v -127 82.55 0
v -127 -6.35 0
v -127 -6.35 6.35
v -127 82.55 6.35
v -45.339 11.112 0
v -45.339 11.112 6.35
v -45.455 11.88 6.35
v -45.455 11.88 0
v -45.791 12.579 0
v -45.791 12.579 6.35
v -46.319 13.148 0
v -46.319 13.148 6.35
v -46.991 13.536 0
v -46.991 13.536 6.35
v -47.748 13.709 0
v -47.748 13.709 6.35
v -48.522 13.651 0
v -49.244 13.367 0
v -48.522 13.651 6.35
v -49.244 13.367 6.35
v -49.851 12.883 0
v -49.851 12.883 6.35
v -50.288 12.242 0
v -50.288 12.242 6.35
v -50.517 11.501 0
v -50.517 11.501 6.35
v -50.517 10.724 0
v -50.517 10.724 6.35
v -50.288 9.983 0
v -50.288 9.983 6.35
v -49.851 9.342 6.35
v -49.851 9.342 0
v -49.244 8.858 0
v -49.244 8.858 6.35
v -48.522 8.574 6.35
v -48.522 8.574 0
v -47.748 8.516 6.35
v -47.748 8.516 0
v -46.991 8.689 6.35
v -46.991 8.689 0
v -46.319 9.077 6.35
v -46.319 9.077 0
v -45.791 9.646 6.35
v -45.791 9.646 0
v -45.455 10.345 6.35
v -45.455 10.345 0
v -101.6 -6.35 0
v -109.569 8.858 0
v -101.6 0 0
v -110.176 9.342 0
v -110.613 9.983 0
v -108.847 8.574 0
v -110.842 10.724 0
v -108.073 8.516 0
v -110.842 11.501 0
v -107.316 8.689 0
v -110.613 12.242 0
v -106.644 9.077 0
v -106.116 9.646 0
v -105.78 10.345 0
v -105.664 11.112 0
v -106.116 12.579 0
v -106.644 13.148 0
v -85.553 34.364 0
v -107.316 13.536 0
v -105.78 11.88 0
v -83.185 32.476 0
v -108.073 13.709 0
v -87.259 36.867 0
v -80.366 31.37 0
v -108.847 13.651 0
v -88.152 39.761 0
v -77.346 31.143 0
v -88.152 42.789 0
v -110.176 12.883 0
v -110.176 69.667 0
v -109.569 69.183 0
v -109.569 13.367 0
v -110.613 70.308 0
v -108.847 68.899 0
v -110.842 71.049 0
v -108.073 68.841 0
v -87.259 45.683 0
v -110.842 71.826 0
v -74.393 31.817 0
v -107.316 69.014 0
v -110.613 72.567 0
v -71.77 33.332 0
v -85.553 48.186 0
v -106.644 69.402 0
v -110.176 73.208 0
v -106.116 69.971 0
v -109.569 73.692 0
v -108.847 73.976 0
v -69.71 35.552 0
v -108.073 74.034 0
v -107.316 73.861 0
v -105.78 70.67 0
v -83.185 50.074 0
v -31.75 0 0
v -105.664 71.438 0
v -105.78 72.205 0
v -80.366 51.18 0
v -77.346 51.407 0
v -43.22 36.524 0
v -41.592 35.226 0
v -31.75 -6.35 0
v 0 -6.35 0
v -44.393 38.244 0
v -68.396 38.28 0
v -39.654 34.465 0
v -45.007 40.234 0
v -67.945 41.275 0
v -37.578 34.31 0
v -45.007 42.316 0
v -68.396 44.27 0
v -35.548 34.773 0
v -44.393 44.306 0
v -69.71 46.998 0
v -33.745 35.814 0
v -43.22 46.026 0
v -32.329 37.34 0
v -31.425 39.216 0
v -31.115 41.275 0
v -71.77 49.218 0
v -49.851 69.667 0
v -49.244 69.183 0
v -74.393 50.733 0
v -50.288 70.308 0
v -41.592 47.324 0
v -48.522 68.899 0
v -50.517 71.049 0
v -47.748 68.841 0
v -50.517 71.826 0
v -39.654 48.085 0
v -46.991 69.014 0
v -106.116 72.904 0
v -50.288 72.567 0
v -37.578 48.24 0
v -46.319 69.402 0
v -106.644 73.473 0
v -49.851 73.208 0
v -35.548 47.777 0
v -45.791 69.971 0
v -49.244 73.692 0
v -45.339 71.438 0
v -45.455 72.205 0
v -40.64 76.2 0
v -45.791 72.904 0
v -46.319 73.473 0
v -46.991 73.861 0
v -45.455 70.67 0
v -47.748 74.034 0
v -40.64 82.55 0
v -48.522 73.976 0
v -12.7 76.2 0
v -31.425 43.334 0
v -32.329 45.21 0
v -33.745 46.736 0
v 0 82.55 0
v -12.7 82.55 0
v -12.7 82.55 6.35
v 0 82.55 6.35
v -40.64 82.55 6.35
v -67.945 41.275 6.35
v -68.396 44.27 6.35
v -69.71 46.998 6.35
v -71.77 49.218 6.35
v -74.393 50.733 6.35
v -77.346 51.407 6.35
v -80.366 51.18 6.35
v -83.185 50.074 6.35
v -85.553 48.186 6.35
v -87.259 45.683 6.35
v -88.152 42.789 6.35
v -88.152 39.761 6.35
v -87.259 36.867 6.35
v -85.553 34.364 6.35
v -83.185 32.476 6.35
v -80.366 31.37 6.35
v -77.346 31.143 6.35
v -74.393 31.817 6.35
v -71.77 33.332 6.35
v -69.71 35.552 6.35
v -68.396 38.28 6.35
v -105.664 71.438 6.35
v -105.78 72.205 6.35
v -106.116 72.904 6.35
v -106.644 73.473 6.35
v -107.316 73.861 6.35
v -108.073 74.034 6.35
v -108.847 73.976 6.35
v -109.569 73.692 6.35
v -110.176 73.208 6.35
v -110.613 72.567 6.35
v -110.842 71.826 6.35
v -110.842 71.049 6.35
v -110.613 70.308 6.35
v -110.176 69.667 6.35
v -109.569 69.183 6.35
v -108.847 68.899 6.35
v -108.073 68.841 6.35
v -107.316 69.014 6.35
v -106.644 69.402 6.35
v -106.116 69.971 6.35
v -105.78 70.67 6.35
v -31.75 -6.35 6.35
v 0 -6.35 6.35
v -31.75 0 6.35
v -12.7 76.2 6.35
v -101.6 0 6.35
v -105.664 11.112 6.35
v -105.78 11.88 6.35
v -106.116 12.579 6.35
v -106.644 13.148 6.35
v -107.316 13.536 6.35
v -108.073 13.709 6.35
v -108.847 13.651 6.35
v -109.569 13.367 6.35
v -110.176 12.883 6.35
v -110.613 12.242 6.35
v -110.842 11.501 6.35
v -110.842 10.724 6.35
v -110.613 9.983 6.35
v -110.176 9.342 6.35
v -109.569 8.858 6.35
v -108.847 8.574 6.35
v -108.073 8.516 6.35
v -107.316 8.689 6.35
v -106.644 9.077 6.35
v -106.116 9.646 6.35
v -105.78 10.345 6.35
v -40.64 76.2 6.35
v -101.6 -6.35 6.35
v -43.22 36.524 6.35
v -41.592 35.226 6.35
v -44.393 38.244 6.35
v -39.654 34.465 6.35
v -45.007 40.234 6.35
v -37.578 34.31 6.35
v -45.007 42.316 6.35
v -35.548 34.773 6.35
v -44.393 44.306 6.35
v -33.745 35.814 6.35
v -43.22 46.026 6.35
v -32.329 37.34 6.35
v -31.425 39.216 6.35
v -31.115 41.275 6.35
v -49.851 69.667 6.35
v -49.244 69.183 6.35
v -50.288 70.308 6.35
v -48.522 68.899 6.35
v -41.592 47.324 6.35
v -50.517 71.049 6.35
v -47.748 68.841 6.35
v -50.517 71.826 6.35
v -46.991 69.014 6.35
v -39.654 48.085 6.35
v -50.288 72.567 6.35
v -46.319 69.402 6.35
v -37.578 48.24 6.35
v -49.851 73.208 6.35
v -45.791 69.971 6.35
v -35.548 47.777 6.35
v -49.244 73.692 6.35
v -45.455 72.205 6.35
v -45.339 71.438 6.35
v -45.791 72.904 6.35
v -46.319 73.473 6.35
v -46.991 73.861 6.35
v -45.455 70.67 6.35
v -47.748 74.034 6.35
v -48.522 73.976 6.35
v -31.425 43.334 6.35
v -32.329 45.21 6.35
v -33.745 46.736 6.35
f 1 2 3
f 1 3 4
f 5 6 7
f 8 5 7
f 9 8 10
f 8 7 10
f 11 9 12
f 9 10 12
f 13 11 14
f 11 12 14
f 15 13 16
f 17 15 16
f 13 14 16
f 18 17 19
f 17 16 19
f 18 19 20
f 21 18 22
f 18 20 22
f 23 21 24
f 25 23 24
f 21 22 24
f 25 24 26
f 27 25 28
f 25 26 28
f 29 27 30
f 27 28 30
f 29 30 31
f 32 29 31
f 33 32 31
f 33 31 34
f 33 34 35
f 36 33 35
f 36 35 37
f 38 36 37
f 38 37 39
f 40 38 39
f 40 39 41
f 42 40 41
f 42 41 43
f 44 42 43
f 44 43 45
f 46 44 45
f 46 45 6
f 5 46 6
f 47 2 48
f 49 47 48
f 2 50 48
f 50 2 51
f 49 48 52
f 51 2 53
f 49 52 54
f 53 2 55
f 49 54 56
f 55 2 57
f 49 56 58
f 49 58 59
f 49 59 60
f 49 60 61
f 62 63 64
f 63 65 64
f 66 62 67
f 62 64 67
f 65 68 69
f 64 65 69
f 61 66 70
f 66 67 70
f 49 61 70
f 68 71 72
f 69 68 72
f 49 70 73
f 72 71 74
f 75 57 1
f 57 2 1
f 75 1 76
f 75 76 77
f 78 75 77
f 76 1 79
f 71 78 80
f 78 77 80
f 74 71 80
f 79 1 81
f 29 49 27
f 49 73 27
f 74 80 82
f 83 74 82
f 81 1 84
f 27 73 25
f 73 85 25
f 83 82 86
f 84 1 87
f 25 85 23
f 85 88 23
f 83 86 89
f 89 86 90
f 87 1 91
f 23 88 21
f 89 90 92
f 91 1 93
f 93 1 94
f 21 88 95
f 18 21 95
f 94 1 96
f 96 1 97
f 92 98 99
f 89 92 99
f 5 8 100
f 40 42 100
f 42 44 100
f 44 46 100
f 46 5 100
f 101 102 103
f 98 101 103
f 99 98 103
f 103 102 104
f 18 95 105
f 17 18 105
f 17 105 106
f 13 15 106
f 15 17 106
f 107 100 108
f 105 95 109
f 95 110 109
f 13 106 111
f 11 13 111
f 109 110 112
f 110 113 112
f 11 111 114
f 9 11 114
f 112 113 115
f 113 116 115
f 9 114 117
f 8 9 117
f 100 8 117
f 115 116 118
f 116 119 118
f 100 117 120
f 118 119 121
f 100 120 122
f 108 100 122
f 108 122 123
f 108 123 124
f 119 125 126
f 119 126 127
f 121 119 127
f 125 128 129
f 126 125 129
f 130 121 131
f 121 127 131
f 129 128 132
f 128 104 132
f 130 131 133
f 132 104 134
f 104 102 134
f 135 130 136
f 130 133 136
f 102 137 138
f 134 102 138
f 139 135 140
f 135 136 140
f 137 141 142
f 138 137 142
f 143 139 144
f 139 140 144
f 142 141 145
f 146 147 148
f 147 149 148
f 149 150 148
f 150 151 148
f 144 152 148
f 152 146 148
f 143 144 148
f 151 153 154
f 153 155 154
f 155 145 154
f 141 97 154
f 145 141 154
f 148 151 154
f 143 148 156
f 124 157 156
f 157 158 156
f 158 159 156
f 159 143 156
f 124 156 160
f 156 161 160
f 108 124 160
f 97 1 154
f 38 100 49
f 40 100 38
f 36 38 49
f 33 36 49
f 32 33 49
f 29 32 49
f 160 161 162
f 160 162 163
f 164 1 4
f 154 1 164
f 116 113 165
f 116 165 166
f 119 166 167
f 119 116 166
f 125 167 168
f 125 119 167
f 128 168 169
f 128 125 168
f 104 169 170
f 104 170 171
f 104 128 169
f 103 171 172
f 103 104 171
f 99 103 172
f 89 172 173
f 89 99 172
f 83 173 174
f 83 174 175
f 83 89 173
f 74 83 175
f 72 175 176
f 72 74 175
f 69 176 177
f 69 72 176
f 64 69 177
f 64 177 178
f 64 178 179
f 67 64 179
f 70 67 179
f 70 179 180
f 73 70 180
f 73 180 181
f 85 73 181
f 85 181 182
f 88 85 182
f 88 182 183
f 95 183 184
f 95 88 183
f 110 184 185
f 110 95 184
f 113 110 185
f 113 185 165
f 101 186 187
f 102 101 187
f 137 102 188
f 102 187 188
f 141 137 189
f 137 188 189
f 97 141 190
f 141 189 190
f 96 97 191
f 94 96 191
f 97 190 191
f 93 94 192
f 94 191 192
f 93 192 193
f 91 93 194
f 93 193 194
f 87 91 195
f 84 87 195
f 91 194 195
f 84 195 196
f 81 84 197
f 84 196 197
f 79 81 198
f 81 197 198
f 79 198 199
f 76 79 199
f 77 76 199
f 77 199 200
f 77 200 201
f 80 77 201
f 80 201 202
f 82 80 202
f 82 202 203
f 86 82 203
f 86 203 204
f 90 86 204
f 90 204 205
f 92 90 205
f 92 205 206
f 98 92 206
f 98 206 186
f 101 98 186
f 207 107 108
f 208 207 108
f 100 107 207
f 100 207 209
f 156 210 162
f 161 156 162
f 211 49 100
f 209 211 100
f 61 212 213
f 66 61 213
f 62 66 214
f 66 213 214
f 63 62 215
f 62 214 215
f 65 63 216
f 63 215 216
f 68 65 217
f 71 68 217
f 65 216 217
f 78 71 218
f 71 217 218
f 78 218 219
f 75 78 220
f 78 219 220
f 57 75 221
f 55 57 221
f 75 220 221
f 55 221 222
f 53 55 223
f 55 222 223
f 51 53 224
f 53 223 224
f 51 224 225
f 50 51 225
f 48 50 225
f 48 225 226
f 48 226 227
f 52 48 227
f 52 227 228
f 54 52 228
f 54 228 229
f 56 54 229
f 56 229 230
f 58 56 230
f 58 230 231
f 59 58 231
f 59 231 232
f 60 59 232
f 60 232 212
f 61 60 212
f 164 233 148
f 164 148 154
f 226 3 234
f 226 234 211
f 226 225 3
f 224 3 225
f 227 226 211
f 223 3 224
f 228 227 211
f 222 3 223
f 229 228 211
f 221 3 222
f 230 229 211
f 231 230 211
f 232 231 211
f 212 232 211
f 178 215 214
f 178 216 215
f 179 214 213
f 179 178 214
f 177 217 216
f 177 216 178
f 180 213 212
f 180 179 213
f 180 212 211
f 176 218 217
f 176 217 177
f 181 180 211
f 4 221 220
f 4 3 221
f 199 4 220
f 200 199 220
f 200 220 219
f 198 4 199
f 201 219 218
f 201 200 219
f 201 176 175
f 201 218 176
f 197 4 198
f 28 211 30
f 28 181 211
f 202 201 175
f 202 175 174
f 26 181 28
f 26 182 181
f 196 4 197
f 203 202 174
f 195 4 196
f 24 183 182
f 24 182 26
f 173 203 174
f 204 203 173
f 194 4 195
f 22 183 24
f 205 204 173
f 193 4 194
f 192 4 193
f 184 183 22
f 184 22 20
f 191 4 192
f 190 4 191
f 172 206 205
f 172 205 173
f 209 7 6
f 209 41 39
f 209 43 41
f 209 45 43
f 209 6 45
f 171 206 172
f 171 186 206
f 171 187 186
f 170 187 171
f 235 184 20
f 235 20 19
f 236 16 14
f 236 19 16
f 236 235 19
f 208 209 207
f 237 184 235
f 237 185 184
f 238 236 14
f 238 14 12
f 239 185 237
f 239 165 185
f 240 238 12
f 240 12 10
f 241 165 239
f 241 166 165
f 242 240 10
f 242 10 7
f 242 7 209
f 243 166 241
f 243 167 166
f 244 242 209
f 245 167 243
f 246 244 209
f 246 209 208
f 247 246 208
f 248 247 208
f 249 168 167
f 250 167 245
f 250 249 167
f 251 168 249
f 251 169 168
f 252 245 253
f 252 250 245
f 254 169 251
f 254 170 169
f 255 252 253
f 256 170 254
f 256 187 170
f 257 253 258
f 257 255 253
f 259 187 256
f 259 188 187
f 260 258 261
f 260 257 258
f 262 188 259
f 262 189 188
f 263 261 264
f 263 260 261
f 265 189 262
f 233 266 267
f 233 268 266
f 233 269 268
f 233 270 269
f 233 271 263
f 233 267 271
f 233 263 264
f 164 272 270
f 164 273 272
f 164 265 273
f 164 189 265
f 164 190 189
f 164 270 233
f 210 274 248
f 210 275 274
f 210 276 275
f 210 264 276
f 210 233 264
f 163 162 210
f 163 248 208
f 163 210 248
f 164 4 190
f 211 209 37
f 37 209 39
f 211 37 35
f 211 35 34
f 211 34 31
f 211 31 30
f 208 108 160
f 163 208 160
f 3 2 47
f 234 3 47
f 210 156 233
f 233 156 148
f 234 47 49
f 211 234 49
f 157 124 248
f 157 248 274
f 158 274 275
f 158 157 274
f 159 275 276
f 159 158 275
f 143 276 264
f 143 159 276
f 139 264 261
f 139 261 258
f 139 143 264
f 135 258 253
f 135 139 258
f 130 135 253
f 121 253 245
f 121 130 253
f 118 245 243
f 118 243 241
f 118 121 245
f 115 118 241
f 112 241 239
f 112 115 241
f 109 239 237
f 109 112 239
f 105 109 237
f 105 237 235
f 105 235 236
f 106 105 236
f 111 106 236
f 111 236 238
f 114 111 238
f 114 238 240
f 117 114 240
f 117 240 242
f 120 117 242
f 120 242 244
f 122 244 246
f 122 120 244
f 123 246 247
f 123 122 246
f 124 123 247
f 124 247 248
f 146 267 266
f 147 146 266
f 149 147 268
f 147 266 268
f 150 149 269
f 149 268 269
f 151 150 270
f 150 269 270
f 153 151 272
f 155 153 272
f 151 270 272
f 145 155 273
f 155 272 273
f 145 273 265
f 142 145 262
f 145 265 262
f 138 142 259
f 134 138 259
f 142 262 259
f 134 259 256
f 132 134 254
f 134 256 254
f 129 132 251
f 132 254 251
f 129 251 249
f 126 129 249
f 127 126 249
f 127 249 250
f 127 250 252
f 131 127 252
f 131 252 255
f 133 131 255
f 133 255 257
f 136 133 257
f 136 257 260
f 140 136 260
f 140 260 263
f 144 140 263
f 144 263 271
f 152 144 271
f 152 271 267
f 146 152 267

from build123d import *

# Parameters (mm, degrees)
SKETCH1_W           = 127
SKETCH1_H           = 82.55
SKETCH1_R           = 10.16
SKETCH1_R_2         = 6.985
SKETCH1_W_2         = 25.4
SKETCH1_H_2         = 6.35
SKETCH1_W_3         = 31.75
BOSS_EXTRUDE1_DEPTH = 6.35
SKETCH3_R           = 2.6035
CUT_EXTRUDE1_DEPTH  = 152.604172106
SKETCH4_W           = 27.94
SKETCH4_H           = 6.35
CUT_EXTRUDE2_DEPTH  = 6.35


with BuildPart() as part:
    # Sketch1 → Boss-Extrude1 (new body)
    # profile 1 of 3: a face of its own
    with BuildSketch(Plane.XY):
        with Locations((-63.5, 41.275)):
            Rectangle(SKETCH1_W, SKETCH1_H)
        with Locations((-78.105, 41.275)):
            Circle(SKETCH1_R, mode=Mode.SUBTRACT)
        with Locations((-38.1, 41.275)):
            Circle(SKETCH1_R_2, mode=Mode.SUBTRACT)
    # profile 2 of 3: a face of its own
    with BuildSketch(Plane.XY):
        with Locations((-114.3, -3.175)):
            Rectangle(SKETCH1_W_2, SKETCH1_H_2)
    # profile 3 of 3: a face of its own
    with BuildSketch(Plane.XY):
        with Locations((-15.875, -3.175)):
            Rectangle(SKETCH1_W_3, SKETCH1_H_2)
    extrude(amount=BOSS_EXTRUDE1_DEPTH)

    # Sketch3 → Cut-Extrude1 (cut, through all)
    with BuildSketch(Plane.XY.offset(6.35)):
        with Locations((-108.2675, 71.4375)):
            Circle(SKETCH3_R)
        with Locations((-47.9425, 71.4375)):
            Circle(SKETCH3_R)
        with Locations((-108.2675, 11.1125)):
            Circle(SKETCH3_R)
        with Locations((-47.9425, 11.1125)):
            Circle(SKETCH3_R)
    extrude(amount=-CUT_EXTRUDE1_DEPTH, mode=Mode.SUBTRACT)

    # Sketch4 → Cut-Extrude2 (cut)
    with BuildSketch(Plane(origin=(0, 0, 0), x_dir=(-1, 0, 0), z_dir=(0, 0, -1))):
        with Locations((26.67, 79.375)):
            Rectangle(SKETCH4_W, SKETCH4_H)
    extrude(amount=-CUT_EXTRUDE2_DEPTH, mode=Mode.SUBTRACT)


solid = part.part
